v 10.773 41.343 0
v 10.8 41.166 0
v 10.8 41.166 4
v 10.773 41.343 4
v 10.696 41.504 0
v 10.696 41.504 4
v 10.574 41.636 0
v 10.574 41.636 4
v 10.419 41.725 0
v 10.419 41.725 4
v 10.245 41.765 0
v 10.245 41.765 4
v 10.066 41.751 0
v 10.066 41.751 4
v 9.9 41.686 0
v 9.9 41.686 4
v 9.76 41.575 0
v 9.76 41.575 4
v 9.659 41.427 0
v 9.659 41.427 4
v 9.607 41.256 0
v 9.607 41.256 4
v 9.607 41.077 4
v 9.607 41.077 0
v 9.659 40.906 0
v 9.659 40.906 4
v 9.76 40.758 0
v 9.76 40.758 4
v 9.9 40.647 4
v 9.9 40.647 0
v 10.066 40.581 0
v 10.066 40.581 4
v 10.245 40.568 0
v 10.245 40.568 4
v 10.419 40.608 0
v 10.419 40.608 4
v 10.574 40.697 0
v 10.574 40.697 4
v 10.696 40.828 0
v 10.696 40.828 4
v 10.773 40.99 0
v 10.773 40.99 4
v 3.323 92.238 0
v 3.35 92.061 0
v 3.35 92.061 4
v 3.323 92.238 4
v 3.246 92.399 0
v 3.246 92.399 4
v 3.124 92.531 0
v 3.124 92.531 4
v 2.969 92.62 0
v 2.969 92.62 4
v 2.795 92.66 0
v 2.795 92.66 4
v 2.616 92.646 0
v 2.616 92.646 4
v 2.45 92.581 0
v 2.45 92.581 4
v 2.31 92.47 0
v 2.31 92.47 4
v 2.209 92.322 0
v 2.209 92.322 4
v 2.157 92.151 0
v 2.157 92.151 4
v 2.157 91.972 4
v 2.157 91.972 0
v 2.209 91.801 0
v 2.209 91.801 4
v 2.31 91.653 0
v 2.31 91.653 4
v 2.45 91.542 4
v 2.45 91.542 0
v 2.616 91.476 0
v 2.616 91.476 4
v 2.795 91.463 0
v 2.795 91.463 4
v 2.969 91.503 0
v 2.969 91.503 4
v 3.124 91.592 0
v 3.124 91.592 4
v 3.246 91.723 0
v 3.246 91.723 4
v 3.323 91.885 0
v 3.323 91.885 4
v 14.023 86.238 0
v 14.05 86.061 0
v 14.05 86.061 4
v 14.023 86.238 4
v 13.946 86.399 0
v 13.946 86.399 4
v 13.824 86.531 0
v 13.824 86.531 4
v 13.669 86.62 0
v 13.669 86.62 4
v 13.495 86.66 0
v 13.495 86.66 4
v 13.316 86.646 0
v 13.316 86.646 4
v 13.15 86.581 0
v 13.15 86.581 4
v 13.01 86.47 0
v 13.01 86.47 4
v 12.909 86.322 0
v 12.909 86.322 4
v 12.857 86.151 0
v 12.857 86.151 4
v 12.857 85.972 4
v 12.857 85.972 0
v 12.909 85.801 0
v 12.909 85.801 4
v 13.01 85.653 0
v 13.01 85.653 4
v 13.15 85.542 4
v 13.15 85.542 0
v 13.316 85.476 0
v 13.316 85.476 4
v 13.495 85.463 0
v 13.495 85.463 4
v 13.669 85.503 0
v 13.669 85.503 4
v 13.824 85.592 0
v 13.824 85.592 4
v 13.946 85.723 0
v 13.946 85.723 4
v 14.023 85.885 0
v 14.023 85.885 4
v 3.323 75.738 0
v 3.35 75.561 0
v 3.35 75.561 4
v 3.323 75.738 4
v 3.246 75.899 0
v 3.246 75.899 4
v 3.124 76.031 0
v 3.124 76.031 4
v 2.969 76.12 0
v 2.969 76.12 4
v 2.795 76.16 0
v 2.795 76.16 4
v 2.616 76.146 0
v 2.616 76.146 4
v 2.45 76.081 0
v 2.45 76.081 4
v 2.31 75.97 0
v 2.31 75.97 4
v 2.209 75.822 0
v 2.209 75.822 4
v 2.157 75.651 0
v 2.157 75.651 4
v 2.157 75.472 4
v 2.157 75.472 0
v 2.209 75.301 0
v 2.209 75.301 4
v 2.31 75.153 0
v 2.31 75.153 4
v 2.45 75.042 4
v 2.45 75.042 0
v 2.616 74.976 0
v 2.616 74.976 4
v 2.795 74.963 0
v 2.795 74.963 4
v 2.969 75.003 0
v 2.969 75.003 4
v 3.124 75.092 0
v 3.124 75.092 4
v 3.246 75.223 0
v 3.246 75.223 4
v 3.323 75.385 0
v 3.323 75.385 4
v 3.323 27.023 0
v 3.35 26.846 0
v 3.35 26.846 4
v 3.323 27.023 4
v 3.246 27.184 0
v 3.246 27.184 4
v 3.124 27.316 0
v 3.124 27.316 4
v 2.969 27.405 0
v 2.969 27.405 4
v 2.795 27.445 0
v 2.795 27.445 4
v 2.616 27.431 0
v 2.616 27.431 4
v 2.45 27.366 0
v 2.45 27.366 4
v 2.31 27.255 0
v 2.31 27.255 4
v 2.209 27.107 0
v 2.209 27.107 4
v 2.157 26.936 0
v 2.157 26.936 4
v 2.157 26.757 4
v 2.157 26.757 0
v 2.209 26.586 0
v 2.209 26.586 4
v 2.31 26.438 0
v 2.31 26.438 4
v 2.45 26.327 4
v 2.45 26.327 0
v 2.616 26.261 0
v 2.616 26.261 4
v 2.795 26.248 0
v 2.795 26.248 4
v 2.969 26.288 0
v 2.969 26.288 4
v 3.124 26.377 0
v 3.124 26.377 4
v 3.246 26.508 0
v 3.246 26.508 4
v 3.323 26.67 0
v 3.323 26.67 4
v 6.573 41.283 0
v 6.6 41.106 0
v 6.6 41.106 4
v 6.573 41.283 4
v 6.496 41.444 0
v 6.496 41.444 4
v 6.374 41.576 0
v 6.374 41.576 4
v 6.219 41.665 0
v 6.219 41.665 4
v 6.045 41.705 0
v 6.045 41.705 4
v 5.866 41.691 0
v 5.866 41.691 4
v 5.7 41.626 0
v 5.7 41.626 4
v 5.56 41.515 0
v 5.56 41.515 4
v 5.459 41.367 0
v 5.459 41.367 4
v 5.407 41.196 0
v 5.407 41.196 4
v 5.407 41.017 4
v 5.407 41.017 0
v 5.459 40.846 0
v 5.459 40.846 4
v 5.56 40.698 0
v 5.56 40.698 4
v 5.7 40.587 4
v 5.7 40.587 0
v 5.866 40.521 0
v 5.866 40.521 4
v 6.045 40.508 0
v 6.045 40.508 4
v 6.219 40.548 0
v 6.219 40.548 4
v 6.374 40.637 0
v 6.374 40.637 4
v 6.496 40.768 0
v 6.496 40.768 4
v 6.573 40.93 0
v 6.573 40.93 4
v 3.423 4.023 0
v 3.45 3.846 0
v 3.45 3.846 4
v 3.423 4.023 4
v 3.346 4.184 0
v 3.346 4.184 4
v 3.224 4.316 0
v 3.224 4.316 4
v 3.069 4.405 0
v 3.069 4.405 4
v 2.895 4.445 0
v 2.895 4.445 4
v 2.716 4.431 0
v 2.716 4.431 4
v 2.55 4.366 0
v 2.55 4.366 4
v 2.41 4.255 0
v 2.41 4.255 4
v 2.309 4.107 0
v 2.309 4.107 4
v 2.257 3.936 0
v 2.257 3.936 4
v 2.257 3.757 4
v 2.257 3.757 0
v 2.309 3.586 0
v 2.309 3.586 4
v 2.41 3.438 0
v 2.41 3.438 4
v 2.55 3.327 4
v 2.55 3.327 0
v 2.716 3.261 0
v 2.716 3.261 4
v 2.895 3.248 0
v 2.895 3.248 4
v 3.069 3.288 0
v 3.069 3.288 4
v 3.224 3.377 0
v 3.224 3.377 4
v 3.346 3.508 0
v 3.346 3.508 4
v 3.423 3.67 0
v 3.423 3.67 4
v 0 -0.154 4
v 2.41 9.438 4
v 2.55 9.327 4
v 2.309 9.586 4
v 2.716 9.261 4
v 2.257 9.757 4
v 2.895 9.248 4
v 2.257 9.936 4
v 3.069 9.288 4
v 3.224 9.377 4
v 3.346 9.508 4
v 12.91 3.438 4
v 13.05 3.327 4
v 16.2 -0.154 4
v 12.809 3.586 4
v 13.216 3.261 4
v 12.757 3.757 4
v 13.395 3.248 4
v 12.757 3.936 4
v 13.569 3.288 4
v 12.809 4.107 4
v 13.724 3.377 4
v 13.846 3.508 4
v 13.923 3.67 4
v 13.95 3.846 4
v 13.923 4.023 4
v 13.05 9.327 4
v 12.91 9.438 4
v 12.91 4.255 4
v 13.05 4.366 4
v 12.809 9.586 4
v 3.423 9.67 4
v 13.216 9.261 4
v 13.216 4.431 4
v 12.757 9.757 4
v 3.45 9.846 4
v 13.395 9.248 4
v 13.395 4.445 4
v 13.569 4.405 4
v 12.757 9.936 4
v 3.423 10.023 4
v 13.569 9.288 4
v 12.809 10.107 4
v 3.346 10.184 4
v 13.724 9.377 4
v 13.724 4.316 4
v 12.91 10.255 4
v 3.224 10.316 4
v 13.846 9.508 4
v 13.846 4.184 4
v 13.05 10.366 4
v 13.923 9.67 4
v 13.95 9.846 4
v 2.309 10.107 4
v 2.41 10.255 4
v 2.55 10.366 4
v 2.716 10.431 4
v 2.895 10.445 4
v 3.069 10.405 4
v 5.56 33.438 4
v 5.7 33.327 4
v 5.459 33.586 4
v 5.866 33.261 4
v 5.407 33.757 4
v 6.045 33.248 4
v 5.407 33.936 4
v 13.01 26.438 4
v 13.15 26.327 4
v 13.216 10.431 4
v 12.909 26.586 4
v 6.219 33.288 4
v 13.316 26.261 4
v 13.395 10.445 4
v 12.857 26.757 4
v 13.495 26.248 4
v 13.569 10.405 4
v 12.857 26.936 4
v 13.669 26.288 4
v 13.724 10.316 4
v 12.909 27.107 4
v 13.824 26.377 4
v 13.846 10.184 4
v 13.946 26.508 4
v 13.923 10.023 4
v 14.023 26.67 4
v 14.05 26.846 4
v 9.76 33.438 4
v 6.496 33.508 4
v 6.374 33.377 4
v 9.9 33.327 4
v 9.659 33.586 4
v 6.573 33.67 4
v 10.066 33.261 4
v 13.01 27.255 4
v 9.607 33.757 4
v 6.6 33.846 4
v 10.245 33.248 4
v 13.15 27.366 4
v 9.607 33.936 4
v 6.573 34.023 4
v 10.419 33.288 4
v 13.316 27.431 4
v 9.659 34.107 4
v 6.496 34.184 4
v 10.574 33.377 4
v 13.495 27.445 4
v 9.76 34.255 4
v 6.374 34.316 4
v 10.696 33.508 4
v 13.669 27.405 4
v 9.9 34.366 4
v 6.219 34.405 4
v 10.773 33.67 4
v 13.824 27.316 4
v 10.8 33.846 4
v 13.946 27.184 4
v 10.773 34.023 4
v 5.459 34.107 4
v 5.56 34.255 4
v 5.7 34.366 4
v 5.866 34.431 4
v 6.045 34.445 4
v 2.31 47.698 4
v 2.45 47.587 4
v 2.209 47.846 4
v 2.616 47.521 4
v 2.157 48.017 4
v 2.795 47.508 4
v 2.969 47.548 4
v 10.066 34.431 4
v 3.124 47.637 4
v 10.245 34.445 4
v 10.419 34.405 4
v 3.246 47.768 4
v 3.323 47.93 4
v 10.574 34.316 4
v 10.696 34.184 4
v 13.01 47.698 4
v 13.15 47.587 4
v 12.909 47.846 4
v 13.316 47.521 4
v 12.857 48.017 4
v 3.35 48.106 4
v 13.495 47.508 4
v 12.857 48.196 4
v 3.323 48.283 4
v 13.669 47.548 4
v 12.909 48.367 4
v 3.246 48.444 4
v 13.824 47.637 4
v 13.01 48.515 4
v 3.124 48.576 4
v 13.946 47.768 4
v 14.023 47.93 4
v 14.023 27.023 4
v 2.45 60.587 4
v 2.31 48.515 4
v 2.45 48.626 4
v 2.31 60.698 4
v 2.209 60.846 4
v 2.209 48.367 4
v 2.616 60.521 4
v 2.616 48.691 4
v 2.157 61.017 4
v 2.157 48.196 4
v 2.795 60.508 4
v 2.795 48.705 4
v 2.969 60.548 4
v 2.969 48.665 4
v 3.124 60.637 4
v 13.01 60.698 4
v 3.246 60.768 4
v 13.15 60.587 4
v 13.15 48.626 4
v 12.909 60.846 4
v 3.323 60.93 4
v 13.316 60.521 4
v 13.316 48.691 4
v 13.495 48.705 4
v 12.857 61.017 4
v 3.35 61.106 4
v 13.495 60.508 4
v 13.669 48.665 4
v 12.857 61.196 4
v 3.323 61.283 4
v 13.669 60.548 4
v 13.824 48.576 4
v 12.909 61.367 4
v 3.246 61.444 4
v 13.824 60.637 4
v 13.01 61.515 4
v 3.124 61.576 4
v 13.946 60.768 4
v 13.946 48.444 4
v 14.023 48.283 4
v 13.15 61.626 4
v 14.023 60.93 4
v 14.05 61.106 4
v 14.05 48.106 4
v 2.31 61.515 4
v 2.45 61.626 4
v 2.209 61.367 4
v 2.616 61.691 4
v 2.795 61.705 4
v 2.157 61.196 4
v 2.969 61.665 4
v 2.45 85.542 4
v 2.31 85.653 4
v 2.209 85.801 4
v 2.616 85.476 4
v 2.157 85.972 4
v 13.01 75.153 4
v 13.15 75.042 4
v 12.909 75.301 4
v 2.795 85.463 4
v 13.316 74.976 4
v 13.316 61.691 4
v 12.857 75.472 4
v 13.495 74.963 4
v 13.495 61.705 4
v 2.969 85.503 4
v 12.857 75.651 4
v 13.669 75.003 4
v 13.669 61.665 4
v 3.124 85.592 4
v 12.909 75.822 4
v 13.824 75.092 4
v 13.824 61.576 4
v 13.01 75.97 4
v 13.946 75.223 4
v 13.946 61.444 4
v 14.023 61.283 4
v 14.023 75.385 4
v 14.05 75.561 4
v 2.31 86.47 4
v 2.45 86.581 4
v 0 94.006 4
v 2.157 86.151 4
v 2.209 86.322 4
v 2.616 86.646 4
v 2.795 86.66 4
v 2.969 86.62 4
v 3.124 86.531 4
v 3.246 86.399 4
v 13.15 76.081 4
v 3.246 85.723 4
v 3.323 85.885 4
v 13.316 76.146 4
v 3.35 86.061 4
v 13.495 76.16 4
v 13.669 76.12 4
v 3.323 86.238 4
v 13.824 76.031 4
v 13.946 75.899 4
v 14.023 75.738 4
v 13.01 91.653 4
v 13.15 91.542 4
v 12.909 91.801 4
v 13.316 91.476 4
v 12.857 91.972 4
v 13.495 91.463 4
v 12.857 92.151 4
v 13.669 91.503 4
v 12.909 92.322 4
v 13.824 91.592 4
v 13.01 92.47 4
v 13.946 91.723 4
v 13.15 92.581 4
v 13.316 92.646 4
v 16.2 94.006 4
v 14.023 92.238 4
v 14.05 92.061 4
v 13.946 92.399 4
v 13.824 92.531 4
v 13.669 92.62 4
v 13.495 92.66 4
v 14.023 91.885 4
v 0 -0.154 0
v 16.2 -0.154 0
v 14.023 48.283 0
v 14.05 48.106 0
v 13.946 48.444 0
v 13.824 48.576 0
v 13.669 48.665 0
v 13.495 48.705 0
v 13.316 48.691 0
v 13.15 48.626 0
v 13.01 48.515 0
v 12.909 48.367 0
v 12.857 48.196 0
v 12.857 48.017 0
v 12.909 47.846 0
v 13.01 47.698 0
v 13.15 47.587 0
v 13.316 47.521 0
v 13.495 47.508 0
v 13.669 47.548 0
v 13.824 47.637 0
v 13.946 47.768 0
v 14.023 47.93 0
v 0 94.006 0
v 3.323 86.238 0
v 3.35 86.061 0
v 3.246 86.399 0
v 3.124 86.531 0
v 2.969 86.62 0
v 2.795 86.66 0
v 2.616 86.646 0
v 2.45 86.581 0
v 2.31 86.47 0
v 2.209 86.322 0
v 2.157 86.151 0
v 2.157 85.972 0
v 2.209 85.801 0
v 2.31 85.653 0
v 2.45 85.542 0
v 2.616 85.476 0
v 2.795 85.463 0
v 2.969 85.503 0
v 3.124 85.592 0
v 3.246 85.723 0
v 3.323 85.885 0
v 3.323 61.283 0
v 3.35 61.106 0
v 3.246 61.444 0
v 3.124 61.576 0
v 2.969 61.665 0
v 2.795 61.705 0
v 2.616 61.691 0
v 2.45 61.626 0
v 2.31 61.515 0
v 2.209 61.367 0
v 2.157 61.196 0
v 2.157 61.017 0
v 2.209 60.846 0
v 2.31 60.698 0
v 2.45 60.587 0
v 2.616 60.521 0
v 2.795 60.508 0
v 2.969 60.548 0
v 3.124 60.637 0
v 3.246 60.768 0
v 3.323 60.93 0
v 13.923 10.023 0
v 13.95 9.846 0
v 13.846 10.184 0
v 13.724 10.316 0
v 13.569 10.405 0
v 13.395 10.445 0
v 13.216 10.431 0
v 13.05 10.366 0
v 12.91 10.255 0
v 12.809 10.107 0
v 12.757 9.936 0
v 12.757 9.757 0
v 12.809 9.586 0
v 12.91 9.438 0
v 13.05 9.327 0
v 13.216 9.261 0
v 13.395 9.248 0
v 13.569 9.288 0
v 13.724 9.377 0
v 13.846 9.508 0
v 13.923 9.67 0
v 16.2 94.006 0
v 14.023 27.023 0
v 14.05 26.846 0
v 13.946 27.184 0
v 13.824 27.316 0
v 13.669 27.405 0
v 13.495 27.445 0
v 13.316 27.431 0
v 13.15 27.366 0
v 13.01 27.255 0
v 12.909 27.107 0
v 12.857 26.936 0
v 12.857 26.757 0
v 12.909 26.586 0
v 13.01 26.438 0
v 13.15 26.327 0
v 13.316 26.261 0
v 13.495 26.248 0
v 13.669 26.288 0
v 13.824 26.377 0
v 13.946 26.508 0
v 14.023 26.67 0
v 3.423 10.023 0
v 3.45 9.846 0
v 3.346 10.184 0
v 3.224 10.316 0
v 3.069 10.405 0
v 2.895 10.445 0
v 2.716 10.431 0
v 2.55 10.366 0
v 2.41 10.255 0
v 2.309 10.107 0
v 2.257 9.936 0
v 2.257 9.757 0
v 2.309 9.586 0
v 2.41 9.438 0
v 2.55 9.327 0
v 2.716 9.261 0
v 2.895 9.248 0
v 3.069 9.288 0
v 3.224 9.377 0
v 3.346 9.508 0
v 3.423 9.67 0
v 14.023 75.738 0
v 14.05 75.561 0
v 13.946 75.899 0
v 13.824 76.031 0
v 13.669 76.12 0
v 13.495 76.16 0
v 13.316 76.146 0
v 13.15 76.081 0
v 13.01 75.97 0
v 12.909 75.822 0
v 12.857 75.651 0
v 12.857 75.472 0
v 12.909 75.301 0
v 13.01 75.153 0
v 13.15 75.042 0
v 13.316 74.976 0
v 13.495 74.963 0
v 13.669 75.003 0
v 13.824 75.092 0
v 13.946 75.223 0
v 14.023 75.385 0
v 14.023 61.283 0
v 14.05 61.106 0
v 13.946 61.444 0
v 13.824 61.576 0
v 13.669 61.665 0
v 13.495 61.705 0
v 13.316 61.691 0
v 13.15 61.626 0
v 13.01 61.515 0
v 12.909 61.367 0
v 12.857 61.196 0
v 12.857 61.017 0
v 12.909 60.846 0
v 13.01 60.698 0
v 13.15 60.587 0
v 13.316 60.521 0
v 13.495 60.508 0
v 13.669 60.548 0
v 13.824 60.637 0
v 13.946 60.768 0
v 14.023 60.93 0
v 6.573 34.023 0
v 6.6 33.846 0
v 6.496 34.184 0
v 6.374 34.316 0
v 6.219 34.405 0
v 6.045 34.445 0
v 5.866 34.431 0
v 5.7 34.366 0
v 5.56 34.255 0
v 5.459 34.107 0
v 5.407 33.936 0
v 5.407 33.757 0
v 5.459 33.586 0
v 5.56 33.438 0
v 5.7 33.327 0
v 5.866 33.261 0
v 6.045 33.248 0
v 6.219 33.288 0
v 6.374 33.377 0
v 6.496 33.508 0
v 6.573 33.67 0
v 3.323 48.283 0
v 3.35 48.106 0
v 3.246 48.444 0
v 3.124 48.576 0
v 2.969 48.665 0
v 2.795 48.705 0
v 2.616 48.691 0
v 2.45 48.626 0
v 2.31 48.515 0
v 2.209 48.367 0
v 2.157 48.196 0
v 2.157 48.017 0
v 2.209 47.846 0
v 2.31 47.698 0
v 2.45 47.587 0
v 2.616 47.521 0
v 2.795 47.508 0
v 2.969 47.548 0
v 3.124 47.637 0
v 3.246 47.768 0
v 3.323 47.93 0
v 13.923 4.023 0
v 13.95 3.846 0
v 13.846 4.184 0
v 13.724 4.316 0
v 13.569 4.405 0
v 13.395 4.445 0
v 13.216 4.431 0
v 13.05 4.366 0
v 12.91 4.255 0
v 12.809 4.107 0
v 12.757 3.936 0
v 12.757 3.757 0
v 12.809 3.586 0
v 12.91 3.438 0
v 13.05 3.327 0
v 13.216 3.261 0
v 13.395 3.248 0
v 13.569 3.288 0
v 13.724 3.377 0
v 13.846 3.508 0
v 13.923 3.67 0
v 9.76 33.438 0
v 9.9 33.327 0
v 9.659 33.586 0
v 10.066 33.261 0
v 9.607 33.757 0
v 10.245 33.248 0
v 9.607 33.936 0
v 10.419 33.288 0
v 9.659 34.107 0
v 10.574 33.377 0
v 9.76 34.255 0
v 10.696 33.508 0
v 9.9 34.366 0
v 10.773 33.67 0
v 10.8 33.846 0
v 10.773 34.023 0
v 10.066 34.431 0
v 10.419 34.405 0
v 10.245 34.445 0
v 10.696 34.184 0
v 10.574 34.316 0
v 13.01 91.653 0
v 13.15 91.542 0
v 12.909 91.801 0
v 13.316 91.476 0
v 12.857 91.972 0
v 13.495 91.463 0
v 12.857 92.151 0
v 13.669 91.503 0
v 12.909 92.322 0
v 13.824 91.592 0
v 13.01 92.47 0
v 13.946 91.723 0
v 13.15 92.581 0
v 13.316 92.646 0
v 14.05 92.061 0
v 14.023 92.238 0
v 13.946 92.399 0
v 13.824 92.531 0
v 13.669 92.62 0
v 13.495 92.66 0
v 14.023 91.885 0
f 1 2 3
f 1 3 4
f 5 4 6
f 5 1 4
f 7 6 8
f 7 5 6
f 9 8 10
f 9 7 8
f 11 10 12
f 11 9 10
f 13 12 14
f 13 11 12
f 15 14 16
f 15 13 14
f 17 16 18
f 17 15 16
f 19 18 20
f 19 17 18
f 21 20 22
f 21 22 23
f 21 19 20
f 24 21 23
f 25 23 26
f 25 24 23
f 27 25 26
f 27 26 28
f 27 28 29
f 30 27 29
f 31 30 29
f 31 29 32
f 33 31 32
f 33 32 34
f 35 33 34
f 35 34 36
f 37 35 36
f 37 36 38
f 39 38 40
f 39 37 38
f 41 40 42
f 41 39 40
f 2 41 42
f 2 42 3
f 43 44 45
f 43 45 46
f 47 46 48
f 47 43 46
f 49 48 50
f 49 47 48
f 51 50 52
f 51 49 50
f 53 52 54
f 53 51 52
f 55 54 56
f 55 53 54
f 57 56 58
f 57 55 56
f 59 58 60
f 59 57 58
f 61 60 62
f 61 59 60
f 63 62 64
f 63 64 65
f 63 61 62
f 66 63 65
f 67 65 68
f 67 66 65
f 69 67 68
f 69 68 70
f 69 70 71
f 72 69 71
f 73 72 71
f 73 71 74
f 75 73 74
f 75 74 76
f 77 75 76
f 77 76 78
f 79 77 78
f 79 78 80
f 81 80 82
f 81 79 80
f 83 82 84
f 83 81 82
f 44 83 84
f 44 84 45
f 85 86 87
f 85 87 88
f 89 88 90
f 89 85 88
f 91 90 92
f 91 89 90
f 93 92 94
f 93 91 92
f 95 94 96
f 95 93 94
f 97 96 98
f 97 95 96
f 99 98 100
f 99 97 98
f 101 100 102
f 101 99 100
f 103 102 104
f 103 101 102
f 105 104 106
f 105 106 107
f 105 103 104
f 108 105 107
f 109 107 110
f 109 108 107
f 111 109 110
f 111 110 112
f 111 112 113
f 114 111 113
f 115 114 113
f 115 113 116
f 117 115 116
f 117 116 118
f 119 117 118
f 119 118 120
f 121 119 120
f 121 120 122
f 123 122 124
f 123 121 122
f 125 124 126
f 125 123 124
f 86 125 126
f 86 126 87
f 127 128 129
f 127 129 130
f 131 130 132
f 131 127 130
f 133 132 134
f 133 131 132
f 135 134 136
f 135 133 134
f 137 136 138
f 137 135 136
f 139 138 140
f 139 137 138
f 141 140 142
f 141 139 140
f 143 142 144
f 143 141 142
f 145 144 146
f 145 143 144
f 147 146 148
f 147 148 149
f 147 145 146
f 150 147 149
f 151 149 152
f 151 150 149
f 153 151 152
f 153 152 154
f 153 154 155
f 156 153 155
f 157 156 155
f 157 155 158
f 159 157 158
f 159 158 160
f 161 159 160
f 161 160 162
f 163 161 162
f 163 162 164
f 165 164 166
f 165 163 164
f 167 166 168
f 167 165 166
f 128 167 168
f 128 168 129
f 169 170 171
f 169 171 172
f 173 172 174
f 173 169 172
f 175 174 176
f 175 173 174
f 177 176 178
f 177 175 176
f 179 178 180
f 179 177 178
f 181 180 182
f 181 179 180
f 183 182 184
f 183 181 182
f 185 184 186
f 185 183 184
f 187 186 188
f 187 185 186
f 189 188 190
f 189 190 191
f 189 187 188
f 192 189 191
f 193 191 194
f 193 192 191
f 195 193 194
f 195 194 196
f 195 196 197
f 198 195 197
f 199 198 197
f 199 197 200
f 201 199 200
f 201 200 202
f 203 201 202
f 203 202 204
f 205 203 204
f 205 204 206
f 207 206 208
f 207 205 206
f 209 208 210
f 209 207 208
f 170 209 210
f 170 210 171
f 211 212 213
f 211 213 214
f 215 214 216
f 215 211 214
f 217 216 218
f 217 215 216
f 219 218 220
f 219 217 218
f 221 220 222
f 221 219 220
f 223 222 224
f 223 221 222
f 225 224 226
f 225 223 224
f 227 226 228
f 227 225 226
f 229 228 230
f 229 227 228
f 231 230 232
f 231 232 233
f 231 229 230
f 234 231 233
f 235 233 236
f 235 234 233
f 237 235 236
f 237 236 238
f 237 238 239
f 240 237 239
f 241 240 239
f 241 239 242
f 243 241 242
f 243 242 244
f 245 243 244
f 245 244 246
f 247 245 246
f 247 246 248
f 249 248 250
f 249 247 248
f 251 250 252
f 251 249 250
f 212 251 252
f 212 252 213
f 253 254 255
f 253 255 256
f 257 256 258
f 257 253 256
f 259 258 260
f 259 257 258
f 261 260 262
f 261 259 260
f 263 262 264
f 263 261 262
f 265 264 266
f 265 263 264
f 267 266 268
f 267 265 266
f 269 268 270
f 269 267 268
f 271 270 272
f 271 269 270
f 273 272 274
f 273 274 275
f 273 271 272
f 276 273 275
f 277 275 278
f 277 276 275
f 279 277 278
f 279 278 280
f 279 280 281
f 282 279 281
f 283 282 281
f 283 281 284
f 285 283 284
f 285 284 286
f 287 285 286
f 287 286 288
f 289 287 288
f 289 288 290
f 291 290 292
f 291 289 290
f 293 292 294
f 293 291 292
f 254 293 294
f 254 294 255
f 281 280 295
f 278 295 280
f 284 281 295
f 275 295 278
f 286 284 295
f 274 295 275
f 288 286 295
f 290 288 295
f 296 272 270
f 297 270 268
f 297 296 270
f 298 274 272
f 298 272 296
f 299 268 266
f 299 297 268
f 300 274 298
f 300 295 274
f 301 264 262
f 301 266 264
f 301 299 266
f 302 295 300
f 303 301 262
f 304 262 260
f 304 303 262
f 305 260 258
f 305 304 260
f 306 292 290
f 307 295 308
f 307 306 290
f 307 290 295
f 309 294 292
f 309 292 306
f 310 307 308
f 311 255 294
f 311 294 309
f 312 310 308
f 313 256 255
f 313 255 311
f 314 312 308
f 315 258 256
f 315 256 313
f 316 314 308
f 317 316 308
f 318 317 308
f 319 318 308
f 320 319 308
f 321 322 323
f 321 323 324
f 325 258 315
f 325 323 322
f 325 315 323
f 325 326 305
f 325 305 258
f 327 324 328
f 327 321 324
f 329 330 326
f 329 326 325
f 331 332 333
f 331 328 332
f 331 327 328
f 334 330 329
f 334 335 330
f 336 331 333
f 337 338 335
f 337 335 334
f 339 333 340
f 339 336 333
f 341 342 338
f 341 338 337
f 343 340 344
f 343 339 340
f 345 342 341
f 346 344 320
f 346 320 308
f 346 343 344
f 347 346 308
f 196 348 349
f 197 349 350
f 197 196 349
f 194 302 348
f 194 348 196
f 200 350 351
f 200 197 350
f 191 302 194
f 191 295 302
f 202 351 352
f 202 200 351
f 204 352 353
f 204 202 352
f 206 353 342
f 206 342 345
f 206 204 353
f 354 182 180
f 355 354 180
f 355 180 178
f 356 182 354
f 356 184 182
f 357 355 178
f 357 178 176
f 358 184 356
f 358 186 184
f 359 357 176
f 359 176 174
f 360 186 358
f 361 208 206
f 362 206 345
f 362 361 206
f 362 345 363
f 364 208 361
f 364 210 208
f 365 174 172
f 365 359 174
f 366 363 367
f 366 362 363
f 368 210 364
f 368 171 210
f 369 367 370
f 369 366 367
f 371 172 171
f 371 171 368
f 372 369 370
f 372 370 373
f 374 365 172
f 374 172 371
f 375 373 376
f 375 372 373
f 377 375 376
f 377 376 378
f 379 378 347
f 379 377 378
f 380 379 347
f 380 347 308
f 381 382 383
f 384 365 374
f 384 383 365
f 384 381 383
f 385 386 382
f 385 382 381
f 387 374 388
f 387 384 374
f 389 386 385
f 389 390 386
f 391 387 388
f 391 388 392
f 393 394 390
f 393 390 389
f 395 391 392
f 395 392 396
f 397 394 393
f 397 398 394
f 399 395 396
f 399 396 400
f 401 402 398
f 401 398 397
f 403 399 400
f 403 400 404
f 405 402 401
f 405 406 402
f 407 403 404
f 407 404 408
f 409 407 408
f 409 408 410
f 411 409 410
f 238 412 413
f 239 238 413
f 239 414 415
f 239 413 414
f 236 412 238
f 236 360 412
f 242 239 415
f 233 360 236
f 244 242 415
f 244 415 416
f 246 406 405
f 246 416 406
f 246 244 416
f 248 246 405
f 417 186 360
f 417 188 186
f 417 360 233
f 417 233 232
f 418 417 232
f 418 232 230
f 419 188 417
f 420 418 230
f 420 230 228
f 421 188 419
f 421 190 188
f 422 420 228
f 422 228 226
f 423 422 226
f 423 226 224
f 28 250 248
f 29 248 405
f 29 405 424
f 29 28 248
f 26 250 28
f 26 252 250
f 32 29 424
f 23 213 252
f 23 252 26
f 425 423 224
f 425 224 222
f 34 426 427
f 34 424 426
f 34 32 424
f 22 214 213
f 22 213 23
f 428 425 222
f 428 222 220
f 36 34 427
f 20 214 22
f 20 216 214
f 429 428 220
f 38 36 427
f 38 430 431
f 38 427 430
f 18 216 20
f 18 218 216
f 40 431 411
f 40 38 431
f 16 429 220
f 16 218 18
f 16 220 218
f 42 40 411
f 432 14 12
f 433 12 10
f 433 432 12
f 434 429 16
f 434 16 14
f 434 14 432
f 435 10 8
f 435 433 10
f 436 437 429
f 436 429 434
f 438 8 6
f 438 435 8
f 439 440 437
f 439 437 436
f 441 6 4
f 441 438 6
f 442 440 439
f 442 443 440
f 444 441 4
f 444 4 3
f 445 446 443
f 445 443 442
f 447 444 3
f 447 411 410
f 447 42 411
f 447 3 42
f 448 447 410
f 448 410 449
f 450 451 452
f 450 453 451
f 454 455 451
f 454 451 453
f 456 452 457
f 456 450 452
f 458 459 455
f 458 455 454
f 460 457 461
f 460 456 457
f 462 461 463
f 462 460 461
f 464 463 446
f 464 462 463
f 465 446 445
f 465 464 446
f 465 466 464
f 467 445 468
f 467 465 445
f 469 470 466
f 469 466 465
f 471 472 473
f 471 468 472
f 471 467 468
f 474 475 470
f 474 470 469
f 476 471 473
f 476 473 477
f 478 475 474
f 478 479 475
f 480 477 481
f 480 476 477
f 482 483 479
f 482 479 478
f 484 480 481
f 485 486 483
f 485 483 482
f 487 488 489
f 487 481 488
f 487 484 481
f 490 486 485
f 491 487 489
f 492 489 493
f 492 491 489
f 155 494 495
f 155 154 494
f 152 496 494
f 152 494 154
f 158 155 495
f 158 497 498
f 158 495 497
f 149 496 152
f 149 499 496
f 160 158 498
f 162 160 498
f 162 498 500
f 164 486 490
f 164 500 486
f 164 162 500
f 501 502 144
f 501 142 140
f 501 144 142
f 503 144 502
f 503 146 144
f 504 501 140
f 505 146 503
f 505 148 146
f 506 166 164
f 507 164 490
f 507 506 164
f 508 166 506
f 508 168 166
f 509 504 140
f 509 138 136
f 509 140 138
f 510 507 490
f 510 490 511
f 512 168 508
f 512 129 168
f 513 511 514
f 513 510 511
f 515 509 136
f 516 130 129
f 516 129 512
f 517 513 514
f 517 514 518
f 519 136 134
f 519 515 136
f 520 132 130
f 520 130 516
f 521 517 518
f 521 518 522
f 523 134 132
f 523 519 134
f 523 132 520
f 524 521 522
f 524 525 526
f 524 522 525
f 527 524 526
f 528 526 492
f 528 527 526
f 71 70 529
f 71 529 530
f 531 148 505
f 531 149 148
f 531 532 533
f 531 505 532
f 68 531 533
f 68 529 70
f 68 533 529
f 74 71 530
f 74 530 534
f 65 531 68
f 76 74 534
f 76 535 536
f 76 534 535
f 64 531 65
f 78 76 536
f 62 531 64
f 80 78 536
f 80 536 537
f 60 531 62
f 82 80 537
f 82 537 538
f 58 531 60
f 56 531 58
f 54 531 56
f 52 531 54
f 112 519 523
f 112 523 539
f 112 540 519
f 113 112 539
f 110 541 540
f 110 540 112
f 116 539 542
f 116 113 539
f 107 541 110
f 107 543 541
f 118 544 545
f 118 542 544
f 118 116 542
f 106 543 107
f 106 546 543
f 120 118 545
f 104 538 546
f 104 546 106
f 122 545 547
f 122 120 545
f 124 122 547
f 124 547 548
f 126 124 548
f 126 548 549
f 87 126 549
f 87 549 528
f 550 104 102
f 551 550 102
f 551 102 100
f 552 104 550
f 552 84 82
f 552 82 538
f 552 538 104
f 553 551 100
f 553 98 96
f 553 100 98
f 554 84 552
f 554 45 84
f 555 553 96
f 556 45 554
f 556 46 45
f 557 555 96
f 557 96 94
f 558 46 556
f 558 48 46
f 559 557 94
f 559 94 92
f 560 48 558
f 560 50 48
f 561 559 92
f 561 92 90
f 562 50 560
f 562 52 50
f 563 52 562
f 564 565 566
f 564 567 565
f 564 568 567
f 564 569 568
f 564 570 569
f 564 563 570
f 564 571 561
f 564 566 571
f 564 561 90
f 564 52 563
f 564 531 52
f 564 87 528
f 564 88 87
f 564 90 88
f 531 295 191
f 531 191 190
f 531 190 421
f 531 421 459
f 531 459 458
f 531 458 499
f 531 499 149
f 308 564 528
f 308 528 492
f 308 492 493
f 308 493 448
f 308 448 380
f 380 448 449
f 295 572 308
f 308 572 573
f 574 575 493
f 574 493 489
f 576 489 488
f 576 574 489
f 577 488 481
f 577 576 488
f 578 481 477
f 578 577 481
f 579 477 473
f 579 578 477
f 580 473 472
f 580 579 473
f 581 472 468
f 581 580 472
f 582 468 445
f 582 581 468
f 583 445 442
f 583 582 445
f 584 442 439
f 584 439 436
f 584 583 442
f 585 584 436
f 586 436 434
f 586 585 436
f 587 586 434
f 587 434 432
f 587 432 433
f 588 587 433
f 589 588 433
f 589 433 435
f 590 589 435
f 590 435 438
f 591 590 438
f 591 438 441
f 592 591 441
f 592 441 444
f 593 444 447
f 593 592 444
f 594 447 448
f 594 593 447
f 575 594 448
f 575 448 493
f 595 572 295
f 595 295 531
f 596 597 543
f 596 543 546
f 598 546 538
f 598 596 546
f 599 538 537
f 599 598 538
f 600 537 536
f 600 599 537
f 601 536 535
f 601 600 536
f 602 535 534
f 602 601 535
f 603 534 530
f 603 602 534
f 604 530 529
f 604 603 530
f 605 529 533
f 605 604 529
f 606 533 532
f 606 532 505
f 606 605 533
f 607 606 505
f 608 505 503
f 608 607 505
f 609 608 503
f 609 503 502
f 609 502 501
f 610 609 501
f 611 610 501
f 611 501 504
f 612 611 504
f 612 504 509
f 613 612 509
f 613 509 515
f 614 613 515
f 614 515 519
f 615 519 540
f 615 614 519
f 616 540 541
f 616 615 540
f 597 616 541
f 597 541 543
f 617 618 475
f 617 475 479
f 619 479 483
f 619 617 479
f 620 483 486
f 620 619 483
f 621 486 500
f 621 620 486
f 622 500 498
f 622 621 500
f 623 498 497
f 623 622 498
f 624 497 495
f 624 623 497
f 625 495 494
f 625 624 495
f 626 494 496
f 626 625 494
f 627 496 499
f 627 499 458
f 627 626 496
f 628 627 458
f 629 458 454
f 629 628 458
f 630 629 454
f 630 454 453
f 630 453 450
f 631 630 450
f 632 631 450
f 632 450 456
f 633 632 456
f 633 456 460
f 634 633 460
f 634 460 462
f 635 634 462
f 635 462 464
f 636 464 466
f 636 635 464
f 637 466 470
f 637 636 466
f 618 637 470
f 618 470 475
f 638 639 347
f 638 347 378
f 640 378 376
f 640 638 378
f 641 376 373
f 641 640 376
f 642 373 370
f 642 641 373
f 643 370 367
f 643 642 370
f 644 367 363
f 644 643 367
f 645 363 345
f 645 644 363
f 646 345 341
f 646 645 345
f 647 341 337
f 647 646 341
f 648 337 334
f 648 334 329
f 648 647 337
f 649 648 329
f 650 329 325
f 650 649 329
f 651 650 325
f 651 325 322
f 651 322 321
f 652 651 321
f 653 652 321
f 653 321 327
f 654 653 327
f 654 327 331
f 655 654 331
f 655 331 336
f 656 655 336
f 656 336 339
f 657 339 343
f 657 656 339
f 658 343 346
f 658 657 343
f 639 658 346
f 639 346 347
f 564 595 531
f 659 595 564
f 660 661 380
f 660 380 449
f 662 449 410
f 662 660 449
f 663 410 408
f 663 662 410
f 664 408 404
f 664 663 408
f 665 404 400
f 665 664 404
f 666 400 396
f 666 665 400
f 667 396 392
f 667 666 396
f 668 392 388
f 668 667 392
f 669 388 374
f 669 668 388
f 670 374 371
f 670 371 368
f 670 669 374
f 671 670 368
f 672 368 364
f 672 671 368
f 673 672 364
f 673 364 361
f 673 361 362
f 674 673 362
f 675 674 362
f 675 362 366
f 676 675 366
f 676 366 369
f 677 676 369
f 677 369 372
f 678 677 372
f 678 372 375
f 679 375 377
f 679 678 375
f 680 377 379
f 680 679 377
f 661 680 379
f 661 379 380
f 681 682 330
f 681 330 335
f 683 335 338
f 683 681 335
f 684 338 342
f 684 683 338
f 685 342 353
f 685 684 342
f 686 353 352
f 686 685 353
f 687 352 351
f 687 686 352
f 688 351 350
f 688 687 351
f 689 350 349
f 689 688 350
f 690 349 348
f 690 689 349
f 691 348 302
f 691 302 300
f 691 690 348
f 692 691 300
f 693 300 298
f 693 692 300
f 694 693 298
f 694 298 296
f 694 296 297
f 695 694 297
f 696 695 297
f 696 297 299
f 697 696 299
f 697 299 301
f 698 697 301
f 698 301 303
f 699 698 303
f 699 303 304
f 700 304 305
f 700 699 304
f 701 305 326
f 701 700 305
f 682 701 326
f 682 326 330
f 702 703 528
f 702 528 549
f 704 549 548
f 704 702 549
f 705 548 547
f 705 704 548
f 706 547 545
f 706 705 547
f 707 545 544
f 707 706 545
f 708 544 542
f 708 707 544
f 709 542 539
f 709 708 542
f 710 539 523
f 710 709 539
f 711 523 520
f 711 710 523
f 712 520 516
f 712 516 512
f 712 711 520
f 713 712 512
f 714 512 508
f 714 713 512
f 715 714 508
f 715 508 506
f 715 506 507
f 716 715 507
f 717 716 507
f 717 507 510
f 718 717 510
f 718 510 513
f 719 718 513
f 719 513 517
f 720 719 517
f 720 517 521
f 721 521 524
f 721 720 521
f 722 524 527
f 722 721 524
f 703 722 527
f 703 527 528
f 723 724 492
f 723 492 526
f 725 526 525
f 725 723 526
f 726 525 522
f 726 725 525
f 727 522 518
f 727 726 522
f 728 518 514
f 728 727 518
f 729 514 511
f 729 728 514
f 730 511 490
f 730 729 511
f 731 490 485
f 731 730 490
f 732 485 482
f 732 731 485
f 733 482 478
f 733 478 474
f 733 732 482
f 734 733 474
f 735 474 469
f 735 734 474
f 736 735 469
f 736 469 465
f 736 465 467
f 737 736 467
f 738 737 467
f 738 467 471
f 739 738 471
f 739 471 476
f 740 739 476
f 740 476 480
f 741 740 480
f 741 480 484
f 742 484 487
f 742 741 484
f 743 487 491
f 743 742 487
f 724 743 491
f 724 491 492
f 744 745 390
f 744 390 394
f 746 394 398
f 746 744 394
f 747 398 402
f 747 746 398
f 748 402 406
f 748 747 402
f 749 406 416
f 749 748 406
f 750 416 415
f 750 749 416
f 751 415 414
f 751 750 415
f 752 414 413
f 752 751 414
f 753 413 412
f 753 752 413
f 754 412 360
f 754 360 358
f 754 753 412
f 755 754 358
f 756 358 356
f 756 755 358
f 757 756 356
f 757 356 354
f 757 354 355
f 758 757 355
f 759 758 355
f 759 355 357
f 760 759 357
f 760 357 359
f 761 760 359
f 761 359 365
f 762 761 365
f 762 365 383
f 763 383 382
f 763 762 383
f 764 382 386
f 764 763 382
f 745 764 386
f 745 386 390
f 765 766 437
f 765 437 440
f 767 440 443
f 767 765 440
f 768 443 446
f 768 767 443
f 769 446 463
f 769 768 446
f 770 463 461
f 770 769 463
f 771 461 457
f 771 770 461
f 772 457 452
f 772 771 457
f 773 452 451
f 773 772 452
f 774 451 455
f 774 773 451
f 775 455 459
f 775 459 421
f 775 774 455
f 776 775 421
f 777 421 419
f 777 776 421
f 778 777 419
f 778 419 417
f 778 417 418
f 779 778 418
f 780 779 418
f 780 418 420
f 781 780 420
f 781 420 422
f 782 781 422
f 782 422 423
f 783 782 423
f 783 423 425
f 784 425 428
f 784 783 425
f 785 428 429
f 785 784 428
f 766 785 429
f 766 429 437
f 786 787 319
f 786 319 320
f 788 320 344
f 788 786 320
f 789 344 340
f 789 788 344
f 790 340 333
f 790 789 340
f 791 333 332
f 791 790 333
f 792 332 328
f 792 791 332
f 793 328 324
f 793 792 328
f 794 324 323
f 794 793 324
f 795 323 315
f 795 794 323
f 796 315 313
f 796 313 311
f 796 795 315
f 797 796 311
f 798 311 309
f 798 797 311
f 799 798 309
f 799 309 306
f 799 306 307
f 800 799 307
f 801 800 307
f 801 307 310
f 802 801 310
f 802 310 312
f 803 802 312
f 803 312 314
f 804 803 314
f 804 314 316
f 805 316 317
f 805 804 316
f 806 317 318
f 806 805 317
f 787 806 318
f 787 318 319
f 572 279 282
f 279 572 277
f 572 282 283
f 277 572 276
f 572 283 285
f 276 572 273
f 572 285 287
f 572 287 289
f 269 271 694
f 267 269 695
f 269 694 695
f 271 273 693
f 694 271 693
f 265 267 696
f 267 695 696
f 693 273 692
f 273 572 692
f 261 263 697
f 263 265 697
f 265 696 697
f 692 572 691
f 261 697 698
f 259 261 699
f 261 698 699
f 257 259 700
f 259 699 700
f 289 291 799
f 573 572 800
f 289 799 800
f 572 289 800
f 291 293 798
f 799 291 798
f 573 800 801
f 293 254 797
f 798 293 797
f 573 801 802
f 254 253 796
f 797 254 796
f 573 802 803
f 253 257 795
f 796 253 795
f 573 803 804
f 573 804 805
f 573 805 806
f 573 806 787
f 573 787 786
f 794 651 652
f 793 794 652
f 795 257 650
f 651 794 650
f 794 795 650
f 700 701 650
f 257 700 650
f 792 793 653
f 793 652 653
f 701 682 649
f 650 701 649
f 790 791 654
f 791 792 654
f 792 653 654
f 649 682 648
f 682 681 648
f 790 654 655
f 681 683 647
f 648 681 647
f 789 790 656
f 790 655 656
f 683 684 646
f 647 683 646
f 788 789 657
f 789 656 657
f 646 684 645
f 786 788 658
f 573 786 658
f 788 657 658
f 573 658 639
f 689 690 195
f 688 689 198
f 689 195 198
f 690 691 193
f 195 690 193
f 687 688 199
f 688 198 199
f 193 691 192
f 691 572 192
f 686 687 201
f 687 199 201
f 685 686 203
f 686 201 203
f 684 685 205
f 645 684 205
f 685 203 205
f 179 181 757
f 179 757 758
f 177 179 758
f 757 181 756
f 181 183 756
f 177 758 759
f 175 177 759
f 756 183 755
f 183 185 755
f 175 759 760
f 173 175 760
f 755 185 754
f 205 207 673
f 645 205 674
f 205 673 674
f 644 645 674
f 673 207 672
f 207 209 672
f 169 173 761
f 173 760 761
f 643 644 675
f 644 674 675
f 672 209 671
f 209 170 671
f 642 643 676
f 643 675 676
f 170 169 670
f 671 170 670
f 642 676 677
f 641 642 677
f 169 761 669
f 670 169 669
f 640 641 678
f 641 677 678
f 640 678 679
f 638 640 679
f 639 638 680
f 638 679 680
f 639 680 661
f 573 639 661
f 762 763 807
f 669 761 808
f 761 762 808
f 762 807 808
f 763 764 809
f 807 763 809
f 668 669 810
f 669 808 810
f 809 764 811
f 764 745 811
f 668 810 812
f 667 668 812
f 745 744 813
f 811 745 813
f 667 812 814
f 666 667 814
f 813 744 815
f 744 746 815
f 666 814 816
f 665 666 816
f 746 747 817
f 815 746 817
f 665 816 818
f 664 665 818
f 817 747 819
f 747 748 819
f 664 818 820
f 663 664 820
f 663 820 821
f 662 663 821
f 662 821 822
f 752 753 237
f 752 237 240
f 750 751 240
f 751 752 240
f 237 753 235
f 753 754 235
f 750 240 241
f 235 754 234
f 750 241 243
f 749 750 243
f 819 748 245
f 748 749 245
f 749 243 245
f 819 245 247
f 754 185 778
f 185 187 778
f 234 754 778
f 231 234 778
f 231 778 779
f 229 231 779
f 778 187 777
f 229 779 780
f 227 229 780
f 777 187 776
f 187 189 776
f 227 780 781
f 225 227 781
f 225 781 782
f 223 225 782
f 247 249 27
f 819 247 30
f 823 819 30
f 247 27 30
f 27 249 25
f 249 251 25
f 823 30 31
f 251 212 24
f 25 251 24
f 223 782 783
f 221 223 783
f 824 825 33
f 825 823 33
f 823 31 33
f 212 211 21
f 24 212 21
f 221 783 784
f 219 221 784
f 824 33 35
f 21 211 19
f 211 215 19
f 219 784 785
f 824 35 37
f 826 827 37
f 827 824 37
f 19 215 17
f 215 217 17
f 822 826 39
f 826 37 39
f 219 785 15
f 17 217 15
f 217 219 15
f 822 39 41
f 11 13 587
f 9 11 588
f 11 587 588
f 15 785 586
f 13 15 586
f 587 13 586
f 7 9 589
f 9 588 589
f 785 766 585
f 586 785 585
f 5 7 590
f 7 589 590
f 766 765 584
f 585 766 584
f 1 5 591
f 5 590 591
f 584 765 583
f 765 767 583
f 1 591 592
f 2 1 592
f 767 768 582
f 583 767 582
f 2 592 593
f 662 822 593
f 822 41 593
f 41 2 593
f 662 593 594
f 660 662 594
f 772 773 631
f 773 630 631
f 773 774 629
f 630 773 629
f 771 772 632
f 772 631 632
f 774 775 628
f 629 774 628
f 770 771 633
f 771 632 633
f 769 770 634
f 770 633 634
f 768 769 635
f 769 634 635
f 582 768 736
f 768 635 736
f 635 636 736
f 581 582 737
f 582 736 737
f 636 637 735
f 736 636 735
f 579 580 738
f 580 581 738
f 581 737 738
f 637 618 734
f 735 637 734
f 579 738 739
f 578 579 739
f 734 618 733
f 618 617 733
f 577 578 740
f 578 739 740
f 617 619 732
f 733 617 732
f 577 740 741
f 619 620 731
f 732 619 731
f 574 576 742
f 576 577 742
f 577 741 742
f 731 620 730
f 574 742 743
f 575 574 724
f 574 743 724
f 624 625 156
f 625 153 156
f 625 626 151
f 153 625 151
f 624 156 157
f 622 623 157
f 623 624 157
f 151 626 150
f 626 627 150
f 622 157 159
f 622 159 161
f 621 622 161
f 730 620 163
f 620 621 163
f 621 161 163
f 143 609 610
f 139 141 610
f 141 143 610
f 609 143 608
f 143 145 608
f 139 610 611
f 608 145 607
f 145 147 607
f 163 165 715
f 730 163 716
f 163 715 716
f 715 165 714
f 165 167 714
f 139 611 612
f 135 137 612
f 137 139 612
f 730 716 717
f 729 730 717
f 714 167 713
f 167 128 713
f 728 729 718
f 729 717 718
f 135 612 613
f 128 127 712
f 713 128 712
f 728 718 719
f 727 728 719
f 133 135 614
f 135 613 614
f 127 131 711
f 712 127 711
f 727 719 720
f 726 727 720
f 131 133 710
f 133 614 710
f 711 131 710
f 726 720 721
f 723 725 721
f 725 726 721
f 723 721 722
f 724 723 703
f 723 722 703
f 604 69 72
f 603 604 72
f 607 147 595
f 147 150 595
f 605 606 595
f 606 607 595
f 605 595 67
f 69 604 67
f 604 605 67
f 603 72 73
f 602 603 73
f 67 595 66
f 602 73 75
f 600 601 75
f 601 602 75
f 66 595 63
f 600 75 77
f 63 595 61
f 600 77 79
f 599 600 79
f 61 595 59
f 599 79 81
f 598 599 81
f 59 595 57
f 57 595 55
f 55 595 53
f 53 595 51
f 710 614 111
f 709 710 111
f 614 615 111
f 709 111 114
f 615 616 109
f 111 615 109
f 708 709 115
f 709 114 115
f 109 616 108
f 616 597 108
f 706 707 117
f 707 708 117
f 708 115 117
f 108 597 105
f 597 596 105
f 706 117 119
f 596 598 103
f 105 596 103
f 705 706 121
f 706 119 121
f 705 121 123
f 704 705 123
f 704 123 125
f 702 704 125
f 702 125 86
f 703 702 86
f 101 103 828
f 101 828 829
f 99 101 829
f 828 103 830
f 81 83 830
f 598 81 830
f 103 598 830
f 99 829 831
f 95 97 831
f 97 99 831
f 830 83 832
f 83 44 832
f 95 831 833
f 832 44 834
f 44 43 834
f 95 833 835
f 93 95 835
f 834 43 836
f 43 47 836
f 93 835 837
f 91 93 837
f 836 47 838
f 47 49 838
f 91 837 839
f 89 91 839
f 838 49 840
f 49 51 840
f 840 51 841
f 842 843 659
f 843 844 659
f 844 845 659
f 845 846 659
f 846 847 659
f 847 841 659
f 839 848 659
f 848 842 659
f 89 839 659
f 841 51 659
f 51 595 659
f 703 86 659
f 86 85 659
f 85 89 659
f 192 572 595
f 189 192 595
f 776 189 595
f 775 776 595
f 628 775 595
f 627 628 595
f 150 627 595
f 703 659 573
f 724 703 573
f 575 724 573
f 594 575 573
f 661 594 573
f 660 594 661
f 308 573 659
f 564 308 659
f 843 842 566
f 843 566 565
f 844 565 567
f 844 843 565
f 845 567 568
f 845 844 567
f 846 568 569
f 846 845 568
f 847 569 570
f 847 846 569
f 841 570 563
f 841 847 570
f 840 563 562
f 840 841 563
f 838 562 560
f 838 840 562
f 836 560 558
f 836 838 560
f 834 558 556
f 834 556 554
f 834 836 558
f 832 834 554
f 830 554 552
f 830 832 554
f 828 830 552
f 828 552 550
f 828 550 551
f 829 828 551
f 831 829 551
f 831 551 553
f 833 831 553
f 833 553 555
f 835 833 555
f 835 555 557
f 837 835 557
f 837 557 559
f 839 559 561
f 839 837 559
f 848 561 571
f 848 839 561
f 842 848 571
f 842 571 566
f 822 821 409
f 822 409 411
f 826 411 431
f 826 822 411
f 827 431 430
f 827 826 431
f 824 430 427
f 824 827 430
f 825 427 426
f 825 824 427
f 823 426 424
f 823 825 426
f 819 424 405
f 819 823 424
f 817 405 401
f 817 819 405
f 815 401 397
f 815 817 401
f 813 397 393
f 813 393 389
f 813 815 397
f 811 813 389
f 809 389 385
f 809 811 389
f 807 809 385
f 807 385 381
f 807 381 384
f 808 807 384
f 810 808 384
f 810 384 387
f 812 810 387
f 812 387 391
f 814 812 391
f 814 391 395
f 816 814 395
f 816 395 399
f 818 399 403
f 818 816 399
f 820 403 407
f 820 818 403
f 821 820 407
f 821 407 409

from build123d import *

# Parameters (mm, degrees)
SKETCH3_W           = 16.2
SKETCH3_H           = 94.16
SKETCH3_R           = 0.6
BOSS_EXTRUDE3_DEPTH = 4


with BuildPart() as part:
    # Sketch3 → Boss-Extrude3 (new body)
    with BuildSketch(Plane.XY):
        with Locations((8.1, 46.926448831)):
            Rectangle(SKETCH3_W, SKETCH3_H)
        with Locations((6, 33.846448831)):
            Circle(SKETCH3_R, mode=Mode.SUBTRACT)
        with Locations((10.2, 33.846448831)):
            Circle(SKETCH3_R, mode=Mode.SUBTRACT)
        with Locations((2.75, 86.061448831)):
            Circle(SKETCH3_R, mode=Mode.SUBTRACT)
        with Locations((10.2, 41.166448831)):
            Circle(SKETCH3_R, mode=Mode.SUBTRACT)
        with Locations((13.45, 48.106448831)):
            Circle(SKETCH3_R, mode=Mode.SUBTRACT)
        with Locations((2.75, 92.061448831)):
            Circle(SKETCH3_R, mode=Mode.SUBTRACT)
        with Locations((13.45, 86.061448831)):
            Circle(SKETCH3_R, mode=Mode.SUBTRACT)
        with Locations((2.75, 61.106448831)):
            Circle(SKETCH3_R, mode=Mode.SUBTRACT)
        with Locations((2.85, 9.846448831)):
            Circle(SKETCH3_R, mode=Mode.SUBTRACT)
        with Locations((13.35, 9.846448831)):
            Circle(SKETCH3_R, mode=Mode.SUBTRACT)
        with Locations((13.35, 3.846448831)):
            Circle(SKETCH3_R, mode=Mode.SUBTRACT)
        with Locations((2.85, 3.846448831)):
            Circle(SKETCH3_R, mode=Mode.SUBTRACT)
        with Locations((13.45, 61.106448831)):
            Circle(SKETCH3_R, mode=Mode.SUBTRACT)
        with Locations((2.75, 75.561448831)):
            Circle(SKETCH3_R, mode=Mode.SUBTRACT)
        with Locations((13.45, 26.846448831)):
            Circle(SKETCH3_R, mode=Mode.SUBTRACT)
        with Locations((13.45, 75.561448831)):
            Circle(SKETCH3_R, mode=Mode.SUBTRACT)
        with Locations((13.45, 92.061448831)):
            Circle(SKETCH3_R, mode=Mode.SUBTRACT)
        with Locations((2.75, 26.846448831)):
            Circle(SKETCH3_R, mode=Mode.SUBTRACT)
        with Locations((6, 41.106448831)):
            Circle(SKETCH3_R, mode=Mode.SUBTRACT)
        with Locations((2.75, 48.106448831)):
            Circle(SKETCH3_R, mode=Mode.SUBTRACT)
    extrude(amount=BOSS_EXTRUDE3_DEPTH)


solid = part.part
